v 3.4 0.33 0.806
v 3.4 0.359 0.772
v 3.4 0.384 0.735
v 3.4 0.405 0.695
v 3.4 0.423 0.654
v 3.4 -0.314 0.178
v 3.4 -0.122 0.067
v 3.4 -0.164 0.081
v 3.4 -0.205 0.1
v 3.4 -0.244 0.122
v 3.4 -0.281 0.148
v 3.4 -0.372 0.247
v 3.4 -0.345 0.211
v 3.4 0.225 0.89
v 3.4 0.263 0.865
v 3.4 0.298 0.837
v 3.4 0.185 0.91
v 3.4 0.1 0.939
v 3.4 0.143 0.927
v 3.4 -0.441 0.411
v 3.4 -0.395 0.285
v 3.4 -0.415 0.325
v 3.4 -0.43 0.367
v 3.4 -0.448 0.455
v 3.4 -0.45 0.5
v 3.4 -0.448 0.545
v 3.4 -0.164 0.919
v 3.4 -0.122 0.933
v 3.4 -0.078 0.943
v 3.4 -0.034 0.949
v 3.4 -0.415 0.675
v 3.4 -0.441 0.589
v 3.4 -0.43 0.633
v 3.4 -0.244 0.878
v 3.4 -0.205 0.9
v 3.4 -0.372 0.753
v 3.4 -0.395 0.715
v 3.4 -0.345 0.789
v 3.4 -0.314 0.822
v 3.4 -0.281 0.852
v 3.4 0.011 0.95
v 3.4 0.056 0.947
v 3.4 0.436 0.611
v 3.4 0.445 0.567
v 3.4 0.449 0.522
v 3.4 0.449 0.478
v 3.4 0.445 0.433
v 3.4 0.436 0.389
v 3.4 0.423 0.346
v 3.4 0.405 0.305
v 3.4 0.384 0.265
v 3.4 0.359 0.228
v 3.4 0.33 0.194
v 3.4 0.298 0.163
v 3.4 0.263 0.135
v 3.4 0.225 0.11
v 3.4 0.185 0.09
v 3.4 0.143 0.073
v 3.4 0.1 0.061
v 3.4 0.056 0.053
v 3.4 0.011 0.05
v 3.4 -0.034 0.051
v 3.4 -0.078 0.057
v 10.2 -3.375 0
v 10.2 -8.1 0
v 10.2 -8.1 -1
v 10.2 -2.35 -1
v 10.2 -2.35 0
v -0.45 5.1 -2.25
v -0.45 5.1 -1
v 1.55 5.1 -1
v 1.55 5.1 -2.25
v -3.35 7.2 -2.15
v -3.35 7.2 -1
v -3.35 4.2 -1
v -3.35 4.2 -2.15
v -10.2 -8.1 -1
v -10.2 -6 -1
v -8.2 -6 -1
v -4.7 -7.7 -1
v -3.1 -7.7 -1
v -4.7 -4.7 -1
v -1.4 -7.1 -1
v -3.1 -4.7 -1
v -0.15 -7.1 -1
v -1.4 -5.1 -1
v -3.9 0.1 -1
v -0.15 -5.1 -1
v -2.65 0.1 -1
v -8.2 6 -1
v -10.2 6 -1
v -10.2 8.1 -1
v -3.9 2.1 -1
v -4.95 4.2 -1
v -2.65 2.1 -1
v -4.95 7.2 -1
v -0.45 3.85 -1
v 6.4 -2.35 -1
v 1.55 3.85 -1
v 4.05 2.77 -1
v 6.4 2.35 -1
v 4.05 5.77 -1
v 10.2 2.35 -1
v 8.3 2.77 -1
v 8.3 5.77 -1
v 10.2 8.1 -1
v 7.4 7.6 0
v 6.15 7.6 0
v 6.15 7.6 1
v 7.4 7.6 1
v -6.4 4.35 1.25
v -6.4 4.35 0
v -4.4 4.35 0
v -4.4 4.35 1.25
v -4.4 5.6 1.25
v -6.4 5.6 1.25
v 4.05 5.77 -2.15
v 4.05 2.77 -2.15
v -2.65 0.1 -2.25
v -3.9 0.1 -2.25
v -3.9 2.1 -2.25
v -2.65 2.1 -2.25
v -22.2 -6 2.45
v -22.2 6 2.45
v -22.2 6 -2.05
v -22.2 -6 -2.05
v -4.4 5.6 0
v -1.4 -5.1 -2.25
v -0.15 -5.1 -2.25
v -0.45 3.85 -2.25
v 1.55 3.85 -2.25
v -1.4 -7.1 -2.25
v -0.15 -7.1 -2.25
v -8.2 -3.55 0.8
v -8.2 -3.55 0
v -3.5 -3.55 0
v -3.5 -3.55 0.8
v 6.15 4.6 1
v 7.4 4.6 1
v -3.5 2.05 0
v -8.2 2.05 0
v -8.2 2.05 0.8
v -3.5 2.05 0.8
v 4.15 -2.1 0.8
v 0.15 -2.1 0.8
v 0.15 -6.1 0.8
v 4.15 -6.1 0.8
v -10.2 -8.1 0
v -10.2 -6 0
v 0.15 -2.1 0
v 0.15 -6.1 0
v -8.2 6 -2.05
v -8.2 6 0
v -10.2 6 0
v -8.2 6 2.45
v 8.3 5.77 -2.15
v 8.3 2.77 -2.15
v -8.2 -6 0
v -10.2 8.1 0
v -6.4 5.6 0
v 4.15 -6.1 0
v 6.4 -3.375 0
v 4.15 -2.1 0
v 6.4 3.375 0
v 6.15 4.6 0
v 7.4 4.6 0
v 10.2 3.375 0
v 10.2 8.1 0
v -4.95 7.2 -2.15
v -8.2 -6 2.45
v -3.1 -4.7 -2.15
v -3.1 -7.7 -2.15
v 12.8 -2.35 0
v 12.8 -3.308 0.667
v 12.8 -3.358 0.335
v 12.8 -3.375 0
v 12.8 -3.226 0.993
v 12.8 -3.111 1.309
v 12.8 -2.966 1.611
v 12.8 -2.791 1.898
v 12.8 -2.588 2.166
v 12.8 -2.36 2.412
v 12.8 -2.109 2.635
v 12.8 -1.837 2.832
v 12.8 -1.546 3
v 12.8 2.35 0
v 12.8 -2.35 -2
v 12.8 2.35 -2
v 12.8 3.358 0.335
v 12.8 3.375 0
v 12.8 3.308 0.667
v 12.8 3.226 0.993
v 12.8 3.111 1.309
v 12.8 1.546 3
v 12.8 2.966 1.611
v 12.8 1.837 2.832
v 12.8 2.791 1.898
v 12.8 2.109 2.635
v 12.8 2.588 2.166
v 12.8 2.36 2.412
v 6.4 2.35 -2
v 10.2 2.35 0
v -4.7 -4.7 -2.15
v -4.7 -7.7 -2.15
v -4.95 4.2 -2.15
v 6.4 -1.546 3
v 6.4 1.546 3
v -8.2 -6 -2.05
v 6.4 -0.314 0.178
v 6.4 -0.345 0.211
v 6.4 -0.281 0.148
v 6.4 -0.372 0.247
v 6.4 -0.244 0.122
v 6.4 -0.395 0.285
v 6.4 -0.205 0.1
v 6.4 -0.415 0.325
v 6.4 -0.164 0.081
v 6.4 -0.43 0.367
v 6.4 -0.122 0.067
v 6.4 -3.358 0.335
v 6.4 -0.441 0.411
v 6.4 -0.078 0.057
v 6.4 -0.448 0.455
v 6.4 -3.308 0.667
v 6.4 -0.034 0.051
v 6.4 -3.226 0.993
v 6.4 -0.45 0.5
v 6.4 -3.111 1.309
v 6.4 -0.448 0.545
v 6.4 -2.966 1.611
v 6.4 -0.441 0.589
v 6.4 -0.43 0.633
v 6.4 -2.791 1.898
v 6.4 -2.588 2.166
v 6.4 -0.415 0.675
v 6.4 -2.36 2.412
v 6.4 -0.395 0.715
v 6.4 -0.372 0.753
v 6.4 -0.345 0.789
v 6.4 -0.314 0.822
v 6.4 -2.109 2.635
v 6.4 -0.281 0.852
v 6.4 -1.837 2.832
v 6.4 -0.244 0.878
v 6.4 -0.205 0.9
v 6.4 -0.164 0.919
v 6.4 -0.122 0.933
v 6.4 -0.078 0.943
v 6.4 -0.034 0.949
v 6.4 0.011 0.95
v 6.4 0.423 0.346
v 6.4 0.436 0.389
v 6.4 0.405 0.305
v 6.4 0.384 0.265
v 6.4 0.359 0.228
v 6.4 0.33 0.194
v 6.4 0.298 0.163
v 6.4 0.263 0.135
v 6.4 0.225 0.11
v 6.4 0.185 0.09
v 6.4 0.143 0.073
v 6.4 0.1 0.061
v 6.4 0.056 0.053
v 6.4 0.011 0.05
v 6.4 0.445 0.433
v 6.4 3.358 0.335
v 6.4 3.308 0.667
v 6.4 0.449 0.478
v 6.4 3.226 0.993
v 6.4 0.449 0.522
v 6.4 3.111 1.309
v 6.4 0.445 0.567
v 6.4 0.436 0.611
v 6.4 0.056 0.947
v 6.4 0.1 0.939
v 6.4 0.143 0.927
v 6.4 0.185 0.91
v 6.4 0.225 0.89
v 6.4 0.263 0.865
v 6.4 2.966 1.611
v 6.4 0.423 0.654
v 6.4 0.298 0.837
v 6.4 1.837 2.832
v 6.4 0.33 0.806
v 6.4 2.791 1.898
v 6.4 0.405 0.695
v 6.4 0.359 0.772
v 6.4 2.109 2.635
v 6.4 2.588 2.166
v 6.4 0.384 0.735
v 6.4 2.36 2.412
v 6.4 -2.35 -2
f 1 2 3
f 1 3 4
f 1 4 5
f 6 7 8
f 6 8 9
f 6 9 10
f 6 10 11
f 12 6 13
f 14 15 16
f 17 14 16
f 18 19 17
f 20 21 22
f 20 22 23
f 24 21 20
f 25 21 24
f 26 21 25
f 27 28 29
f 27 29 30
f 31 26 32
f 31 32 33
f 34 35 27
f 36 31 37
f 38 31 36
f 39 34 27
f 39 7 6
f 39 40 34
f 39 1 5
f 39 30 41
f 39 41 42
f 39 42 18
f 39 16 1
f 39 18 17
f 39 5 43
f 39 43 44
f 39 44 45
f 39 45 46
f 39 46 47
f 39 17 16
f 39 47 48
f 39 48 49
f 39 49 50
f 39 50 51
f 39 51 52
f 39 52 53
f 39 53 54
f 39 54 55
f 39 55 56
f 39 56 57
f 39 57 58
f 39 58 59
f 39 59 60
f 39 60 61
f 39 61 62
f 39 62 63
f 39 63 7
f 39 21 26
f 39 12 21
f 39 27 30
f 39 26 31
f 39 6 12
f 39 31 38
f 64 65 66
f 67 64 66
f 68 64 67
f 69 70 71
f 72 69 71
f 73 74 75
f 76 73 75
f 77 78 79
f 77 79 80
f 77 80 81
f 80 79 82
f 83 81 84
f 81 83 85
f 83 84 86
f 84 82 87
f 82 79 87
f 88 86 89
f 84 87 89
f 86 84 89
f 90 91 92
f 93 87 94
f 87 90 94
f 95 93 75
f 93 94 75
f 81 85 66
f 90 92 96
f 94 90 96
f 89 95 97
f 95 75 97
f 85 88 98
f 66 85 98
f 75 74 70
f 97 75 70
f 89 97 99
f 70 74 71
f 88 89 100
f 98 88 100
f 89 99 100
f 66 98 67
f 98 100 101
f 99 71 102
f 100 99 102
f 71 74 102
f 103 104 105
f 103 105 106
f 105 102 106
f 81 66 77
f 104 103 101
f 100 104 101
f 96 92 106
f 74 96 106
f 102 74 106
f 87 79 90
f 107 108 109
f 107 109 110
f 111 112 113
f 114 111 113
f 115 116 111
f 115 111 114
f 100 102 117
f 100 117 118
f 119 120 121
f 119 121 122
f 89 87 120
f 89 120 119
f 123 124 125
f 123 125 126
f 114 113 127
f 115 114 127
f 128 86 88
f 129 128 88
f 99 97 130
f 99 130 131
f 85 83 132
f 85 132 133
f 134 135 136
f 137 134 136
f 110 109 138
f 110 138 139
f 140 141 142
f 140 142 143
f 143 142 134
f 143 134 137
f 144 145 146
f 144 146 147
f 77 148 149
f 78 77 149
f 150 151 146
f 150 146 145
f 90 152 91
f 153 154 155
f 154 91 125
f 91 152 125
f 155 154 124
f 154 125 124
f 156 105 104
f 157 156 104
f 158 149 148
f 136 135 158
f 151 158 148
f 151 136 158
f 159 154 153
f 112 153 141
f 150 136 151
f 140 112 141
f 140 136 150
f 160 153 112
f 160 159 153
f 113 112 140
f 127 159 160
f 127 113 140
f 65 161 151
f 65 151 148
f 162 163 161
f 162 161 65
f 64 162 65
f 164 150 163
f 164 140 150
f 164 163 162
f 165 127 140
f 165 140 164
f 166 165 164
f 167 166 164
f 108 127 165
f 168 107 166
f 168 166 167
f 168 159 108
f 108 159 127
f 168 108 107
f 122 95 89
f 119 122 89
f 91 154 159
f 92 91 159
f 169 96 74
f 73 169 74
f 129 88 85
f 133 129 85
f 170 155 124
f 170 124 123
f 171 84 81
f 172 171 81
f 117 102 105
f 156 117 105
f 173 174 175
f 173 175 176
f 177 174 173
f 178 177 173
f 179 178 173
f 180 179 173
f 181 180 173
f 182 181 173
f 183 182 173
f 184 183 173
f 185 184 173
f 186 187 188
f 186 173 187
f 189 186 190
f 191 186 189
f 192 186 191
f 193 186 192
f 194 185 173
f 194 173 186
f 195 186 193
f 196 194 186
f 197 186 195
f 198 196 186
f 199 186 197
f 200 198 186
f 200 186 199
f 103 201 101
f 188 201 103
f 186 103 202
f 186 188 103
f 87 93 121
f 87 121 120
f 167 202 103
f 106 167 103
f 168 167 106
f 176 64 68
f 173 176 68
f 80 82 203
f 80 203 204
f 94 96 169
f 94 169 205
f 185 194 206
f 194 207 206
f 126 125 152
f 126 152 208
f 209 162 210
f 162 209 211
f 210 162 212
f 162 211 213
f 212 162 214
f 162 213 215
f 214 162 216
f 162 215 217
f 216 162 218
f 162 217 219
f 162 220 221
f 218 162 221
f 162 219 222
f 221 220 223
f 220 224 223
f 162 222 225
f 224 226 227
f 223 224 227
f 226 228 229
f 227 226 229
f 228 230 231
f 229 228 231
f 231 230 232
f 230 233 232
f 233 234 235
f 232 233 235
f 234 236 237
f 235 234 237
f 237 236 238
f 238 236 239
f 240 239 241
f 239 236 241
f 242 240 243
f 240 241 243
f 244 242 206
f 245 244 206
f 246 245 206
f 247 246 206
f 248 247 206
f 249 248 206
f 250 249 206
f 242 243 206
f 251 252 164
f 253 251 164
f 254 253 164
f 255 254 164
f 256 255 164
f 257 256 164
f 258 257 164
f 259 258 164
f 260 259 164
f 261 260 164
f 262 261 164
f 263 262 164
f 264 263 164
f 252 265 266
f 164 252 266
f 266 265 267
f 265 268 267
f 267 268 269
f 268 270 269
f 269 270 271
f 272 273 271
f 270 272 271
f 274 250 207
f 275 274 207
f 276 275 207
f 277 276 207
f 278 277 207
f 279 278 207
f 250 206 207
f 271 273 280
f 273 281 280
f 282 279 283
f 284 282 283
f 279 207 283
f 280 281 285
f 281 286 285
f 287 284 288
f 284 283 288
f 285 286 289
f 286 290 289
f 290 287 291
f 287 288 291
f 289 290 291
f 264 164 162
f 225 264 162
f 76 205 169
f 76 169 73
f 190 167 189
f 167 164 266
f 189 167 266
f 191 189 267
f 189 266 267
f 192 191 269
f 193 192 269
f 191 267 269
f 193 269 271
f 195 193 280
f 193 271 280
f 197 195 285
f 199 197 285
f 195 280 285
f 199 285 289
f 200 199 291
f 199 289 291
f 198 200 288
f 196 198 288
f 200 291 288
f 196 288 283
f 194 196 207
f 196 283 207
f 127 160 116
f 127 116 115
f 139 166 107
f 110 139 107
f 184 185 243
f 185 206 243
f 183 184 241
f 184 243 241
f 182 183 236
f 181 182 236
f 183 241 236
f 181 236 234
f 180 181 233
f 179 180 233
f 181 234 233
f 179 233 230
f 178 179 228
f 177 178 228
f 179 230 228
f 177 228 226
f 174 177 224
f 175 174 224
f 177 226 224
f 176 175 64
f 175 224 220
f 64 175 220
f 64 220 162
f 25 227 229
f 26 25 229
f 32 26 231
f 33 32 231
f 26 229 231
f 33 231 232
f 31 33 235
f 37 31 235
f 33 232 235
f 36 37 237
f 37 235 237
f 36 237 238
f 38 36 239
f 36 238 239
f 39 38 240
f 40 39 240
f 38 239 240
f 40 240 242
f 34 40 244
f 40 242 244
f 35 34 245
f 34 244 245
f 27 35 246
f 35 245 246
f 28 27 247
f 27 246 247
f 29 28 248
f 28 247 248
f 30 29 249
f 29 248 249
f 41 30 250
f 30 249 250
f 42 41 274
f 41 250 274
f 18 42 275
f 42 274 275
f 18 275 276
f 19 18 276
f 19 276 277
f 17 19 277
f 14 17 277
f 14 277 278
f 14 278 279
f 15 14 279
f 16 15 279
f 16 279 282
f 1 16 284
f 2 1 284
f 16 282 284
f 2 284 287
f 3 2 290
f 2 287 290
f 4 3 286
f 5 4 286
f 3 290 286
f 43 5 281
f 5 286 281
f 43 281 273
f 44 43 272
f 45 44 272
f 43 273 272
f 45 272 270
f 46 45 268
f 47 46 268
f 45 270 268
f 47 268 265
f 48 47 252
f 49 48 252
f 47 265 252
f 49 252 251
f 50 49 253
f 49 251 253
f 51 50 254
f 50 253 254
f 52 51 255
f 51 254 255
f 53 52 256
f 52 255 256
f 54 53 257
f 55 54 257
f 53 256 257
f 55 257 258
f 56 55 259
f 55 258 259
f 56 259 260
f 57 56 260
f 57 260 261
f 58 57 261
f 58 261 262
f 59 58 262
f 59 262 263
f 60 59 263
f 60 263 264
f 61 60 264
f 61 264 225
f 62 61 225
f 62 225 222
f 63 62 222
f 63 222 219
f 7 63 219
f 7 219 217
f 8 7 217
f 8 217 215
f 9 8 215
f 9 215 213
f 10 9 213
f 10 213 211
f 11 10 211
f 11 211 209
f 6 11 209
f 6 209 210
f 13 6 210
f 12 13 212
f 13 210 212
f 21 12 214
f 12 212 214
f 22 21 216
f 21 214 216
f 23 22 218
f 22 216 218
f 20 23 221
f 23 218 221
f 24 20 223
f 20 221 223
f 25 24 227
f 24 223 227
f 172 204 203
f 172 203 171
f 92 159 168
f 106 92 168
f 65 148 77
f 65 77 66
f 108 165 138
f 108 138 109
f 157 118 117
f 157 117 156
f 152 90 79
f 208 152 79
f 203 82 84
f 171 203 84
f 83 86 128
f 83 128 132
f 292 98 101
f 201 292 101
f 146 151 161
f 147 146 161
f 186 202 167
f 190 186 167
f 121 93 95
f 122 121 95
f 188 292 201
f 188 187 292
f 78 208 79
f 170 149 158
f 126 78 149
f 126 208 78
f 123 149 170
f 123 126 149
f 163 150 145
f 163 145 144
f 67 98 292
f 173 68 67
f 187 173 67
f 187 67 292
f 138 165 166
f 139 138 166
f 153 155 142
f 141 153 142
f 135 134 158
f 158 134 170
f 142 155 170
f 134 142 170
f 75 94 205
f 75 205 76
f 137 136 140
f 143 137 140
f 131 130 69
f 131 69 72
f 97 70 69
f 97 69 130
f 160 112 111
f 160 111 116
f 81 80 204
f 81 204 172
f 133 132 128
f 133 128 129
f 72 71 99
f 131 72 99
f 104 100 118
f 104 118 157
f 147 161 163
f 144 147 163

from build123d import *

# Parameters (mm, degrees)
F0_W          = 20.4
F0_H          = 16.2
F1_DEPTH      = 1
F2_W          = 12
F2_H          = 4.5
F3_DEPTH      = 12
F3_DEPTH_BACK = 2
F4_W          = 4.7
F4_H          = 1
F5_DEPTH      = 2.6
F5_DEPTH_BACK = 3.8
F6_R          = 0.45
F7_DEPTH      = 3
F8_W          = 5.6
F8_H          = 5.6
F9_DEPTH      = 0.8
F10_W         = 4
F10_H         = 4
F11_DEPTH     = 0.8
F12_W         = 2
F12_H         = 1.25
F13_DEPTH     = 1.25
F14_W         = 1.25
F14_H         = 3
F15_DEPTH     = 1
F16_W         = 2
F16_H         = 1.25
F16_W_2       = 1.25
F16_H_2       = 2
F17_DEPTH     = 1.25
F18_W         = 1.6
F18_H         = 3
F19_DEPTH     = 1.15
F20_W         = 4.25
F20_H         = 3
F21_DEPTH     = 1.15


with BuildPart() as f1:
    # F0 (on Top) → F1 (new body)
    with BuildSketch(Plane.XY):
        Rectangle(F0_W, F0_H)
    extrude(amount=-F1_DEPTH)

    # F2 (on face) → F3 (join, two sides)
    with BuildSketch(Plane(origin=(-10.2, 0, 0), x_dir=(0, -1, 0), z_dir=(-1, 0, 0))) as f3_sk:
        with Locations((0, 0.2)):
            Rectangle(F2_W, F2_H)
    extrude(amount=F3_DEPTH)
    extrude(f3_sk.sketch, amount=-F3_DEPTH_BACK)

    # F4 (on face) → F5 (join, two sides)
    with BuildSketch(Plane.YZ.offset(10.2)) as f5_sk:
        with Locations((0, -1.5)):
            Rectangle(F4_W, F4_H)
        with Locations((0, -0.5)):
            Rectangle(F4_W, F4_H)
        with BuildLine():
            Line((-3.375, 0), (-2.35, 0))
            Line((-2.35, 0), (2.35, 0))
            Line((2.35, 0), (3.375, 0))
            ThreePointArc((3.375, 0), (2.8817469144, 1.7567469144), (1.5461646096, 3))
            Line((1.5461646096, 3), (-1.5461646096, 3))
            ThreePointArc((-1.5461646096, 3), (-2.8817469144, 1.7567469144), (-3.375, 0))
        make_face()
    extrude(amount=F5_DEPTH)
    extrude(f5_sk.sketch, amount=-F5_DEPTH_BACK)

    # F6 (on face) → F7 (join)
    with BuildSketch(Plane(origin=(6.4, 0, 0), x_dir=(0, -1, 0), z_dir=(-1, 0, 0))):
        with Locations((0, 0.5)):
            Circle(F6_R)
    extrude(amount=F7_DEPTH)

    # F8 (on face) → F9 (join)
    with BuildSketch(Plane.XY):
        with Locations((-6.3, -0.75)):
            Rectangle(F8_W, F8_H)
    extrude(amount=F9_DEPTH)

    # F10 (on face) → F11 (join)
    with BuildSketch(Plane.XY):
        with Locations((2.15, -4.1)):
            Rectangle(F10_W, F10_H)
    extrude(amount=F11_DEPTH)

    # F12 (on face) → F13 (join)
    with BuildSketch(Plane.XY):
        with Locations((-5.4, 4.975)):
            Rectangle(F12_W, F12_H)
    extrude(amount=F13_DEPTH)

    # F14 (on face) → F15 (join)
    with BuildSketch(Plane.XY):
        with Locations((6.775, 6.1)):
            Rectangle(F14_W, F14_H)
    extrude(amount=F15_DEPTH)

    # F16 (on face) → F17 (join)
    with BuildSketch(Plane(origin=(0, 0, -1), x_dir=(1, 0, 0), z_dir=(0, 0, -1))):
        with Locations((0.55, -4.475)):
            Rectangle(F16_W, F16_H)
        with Locations((-3.275, -1.1)):
            Rectangle(F16_W_2, F16_H_2)
        with Locations((-0.775, 6.1)):
            Rectangle(F16_W_2, F16_H_2)
    extrude(amount=F17_DEPTH)

    # F18 (on face) → F19 (join)
    with BuildSketch(Plane(origin=(0, 0, -1), x_dir=(1, 0, 0), z_dir=(0, 0, -1))):
        with Locations((-4.15, -5.7)):
            Rectangle(F18_W, F18_H)
        with Locations((-3.9, 6.2)):
            Rectangle(F18_W, F18_H)
    extrude(amount=F19_DEPTH)

    # F20 (on face) → F21 (join)
    with BuildSketch(Plane(origin=(0, 0, -1), x_dir=(1, 0, 0), z_dir=(0, 0, -1))):
        with Locations((6.175, -4.27)):
            Rectangle(F20_W, F20_H)
    extrude(amount=F21_DEPTH)


solid = f1.part
